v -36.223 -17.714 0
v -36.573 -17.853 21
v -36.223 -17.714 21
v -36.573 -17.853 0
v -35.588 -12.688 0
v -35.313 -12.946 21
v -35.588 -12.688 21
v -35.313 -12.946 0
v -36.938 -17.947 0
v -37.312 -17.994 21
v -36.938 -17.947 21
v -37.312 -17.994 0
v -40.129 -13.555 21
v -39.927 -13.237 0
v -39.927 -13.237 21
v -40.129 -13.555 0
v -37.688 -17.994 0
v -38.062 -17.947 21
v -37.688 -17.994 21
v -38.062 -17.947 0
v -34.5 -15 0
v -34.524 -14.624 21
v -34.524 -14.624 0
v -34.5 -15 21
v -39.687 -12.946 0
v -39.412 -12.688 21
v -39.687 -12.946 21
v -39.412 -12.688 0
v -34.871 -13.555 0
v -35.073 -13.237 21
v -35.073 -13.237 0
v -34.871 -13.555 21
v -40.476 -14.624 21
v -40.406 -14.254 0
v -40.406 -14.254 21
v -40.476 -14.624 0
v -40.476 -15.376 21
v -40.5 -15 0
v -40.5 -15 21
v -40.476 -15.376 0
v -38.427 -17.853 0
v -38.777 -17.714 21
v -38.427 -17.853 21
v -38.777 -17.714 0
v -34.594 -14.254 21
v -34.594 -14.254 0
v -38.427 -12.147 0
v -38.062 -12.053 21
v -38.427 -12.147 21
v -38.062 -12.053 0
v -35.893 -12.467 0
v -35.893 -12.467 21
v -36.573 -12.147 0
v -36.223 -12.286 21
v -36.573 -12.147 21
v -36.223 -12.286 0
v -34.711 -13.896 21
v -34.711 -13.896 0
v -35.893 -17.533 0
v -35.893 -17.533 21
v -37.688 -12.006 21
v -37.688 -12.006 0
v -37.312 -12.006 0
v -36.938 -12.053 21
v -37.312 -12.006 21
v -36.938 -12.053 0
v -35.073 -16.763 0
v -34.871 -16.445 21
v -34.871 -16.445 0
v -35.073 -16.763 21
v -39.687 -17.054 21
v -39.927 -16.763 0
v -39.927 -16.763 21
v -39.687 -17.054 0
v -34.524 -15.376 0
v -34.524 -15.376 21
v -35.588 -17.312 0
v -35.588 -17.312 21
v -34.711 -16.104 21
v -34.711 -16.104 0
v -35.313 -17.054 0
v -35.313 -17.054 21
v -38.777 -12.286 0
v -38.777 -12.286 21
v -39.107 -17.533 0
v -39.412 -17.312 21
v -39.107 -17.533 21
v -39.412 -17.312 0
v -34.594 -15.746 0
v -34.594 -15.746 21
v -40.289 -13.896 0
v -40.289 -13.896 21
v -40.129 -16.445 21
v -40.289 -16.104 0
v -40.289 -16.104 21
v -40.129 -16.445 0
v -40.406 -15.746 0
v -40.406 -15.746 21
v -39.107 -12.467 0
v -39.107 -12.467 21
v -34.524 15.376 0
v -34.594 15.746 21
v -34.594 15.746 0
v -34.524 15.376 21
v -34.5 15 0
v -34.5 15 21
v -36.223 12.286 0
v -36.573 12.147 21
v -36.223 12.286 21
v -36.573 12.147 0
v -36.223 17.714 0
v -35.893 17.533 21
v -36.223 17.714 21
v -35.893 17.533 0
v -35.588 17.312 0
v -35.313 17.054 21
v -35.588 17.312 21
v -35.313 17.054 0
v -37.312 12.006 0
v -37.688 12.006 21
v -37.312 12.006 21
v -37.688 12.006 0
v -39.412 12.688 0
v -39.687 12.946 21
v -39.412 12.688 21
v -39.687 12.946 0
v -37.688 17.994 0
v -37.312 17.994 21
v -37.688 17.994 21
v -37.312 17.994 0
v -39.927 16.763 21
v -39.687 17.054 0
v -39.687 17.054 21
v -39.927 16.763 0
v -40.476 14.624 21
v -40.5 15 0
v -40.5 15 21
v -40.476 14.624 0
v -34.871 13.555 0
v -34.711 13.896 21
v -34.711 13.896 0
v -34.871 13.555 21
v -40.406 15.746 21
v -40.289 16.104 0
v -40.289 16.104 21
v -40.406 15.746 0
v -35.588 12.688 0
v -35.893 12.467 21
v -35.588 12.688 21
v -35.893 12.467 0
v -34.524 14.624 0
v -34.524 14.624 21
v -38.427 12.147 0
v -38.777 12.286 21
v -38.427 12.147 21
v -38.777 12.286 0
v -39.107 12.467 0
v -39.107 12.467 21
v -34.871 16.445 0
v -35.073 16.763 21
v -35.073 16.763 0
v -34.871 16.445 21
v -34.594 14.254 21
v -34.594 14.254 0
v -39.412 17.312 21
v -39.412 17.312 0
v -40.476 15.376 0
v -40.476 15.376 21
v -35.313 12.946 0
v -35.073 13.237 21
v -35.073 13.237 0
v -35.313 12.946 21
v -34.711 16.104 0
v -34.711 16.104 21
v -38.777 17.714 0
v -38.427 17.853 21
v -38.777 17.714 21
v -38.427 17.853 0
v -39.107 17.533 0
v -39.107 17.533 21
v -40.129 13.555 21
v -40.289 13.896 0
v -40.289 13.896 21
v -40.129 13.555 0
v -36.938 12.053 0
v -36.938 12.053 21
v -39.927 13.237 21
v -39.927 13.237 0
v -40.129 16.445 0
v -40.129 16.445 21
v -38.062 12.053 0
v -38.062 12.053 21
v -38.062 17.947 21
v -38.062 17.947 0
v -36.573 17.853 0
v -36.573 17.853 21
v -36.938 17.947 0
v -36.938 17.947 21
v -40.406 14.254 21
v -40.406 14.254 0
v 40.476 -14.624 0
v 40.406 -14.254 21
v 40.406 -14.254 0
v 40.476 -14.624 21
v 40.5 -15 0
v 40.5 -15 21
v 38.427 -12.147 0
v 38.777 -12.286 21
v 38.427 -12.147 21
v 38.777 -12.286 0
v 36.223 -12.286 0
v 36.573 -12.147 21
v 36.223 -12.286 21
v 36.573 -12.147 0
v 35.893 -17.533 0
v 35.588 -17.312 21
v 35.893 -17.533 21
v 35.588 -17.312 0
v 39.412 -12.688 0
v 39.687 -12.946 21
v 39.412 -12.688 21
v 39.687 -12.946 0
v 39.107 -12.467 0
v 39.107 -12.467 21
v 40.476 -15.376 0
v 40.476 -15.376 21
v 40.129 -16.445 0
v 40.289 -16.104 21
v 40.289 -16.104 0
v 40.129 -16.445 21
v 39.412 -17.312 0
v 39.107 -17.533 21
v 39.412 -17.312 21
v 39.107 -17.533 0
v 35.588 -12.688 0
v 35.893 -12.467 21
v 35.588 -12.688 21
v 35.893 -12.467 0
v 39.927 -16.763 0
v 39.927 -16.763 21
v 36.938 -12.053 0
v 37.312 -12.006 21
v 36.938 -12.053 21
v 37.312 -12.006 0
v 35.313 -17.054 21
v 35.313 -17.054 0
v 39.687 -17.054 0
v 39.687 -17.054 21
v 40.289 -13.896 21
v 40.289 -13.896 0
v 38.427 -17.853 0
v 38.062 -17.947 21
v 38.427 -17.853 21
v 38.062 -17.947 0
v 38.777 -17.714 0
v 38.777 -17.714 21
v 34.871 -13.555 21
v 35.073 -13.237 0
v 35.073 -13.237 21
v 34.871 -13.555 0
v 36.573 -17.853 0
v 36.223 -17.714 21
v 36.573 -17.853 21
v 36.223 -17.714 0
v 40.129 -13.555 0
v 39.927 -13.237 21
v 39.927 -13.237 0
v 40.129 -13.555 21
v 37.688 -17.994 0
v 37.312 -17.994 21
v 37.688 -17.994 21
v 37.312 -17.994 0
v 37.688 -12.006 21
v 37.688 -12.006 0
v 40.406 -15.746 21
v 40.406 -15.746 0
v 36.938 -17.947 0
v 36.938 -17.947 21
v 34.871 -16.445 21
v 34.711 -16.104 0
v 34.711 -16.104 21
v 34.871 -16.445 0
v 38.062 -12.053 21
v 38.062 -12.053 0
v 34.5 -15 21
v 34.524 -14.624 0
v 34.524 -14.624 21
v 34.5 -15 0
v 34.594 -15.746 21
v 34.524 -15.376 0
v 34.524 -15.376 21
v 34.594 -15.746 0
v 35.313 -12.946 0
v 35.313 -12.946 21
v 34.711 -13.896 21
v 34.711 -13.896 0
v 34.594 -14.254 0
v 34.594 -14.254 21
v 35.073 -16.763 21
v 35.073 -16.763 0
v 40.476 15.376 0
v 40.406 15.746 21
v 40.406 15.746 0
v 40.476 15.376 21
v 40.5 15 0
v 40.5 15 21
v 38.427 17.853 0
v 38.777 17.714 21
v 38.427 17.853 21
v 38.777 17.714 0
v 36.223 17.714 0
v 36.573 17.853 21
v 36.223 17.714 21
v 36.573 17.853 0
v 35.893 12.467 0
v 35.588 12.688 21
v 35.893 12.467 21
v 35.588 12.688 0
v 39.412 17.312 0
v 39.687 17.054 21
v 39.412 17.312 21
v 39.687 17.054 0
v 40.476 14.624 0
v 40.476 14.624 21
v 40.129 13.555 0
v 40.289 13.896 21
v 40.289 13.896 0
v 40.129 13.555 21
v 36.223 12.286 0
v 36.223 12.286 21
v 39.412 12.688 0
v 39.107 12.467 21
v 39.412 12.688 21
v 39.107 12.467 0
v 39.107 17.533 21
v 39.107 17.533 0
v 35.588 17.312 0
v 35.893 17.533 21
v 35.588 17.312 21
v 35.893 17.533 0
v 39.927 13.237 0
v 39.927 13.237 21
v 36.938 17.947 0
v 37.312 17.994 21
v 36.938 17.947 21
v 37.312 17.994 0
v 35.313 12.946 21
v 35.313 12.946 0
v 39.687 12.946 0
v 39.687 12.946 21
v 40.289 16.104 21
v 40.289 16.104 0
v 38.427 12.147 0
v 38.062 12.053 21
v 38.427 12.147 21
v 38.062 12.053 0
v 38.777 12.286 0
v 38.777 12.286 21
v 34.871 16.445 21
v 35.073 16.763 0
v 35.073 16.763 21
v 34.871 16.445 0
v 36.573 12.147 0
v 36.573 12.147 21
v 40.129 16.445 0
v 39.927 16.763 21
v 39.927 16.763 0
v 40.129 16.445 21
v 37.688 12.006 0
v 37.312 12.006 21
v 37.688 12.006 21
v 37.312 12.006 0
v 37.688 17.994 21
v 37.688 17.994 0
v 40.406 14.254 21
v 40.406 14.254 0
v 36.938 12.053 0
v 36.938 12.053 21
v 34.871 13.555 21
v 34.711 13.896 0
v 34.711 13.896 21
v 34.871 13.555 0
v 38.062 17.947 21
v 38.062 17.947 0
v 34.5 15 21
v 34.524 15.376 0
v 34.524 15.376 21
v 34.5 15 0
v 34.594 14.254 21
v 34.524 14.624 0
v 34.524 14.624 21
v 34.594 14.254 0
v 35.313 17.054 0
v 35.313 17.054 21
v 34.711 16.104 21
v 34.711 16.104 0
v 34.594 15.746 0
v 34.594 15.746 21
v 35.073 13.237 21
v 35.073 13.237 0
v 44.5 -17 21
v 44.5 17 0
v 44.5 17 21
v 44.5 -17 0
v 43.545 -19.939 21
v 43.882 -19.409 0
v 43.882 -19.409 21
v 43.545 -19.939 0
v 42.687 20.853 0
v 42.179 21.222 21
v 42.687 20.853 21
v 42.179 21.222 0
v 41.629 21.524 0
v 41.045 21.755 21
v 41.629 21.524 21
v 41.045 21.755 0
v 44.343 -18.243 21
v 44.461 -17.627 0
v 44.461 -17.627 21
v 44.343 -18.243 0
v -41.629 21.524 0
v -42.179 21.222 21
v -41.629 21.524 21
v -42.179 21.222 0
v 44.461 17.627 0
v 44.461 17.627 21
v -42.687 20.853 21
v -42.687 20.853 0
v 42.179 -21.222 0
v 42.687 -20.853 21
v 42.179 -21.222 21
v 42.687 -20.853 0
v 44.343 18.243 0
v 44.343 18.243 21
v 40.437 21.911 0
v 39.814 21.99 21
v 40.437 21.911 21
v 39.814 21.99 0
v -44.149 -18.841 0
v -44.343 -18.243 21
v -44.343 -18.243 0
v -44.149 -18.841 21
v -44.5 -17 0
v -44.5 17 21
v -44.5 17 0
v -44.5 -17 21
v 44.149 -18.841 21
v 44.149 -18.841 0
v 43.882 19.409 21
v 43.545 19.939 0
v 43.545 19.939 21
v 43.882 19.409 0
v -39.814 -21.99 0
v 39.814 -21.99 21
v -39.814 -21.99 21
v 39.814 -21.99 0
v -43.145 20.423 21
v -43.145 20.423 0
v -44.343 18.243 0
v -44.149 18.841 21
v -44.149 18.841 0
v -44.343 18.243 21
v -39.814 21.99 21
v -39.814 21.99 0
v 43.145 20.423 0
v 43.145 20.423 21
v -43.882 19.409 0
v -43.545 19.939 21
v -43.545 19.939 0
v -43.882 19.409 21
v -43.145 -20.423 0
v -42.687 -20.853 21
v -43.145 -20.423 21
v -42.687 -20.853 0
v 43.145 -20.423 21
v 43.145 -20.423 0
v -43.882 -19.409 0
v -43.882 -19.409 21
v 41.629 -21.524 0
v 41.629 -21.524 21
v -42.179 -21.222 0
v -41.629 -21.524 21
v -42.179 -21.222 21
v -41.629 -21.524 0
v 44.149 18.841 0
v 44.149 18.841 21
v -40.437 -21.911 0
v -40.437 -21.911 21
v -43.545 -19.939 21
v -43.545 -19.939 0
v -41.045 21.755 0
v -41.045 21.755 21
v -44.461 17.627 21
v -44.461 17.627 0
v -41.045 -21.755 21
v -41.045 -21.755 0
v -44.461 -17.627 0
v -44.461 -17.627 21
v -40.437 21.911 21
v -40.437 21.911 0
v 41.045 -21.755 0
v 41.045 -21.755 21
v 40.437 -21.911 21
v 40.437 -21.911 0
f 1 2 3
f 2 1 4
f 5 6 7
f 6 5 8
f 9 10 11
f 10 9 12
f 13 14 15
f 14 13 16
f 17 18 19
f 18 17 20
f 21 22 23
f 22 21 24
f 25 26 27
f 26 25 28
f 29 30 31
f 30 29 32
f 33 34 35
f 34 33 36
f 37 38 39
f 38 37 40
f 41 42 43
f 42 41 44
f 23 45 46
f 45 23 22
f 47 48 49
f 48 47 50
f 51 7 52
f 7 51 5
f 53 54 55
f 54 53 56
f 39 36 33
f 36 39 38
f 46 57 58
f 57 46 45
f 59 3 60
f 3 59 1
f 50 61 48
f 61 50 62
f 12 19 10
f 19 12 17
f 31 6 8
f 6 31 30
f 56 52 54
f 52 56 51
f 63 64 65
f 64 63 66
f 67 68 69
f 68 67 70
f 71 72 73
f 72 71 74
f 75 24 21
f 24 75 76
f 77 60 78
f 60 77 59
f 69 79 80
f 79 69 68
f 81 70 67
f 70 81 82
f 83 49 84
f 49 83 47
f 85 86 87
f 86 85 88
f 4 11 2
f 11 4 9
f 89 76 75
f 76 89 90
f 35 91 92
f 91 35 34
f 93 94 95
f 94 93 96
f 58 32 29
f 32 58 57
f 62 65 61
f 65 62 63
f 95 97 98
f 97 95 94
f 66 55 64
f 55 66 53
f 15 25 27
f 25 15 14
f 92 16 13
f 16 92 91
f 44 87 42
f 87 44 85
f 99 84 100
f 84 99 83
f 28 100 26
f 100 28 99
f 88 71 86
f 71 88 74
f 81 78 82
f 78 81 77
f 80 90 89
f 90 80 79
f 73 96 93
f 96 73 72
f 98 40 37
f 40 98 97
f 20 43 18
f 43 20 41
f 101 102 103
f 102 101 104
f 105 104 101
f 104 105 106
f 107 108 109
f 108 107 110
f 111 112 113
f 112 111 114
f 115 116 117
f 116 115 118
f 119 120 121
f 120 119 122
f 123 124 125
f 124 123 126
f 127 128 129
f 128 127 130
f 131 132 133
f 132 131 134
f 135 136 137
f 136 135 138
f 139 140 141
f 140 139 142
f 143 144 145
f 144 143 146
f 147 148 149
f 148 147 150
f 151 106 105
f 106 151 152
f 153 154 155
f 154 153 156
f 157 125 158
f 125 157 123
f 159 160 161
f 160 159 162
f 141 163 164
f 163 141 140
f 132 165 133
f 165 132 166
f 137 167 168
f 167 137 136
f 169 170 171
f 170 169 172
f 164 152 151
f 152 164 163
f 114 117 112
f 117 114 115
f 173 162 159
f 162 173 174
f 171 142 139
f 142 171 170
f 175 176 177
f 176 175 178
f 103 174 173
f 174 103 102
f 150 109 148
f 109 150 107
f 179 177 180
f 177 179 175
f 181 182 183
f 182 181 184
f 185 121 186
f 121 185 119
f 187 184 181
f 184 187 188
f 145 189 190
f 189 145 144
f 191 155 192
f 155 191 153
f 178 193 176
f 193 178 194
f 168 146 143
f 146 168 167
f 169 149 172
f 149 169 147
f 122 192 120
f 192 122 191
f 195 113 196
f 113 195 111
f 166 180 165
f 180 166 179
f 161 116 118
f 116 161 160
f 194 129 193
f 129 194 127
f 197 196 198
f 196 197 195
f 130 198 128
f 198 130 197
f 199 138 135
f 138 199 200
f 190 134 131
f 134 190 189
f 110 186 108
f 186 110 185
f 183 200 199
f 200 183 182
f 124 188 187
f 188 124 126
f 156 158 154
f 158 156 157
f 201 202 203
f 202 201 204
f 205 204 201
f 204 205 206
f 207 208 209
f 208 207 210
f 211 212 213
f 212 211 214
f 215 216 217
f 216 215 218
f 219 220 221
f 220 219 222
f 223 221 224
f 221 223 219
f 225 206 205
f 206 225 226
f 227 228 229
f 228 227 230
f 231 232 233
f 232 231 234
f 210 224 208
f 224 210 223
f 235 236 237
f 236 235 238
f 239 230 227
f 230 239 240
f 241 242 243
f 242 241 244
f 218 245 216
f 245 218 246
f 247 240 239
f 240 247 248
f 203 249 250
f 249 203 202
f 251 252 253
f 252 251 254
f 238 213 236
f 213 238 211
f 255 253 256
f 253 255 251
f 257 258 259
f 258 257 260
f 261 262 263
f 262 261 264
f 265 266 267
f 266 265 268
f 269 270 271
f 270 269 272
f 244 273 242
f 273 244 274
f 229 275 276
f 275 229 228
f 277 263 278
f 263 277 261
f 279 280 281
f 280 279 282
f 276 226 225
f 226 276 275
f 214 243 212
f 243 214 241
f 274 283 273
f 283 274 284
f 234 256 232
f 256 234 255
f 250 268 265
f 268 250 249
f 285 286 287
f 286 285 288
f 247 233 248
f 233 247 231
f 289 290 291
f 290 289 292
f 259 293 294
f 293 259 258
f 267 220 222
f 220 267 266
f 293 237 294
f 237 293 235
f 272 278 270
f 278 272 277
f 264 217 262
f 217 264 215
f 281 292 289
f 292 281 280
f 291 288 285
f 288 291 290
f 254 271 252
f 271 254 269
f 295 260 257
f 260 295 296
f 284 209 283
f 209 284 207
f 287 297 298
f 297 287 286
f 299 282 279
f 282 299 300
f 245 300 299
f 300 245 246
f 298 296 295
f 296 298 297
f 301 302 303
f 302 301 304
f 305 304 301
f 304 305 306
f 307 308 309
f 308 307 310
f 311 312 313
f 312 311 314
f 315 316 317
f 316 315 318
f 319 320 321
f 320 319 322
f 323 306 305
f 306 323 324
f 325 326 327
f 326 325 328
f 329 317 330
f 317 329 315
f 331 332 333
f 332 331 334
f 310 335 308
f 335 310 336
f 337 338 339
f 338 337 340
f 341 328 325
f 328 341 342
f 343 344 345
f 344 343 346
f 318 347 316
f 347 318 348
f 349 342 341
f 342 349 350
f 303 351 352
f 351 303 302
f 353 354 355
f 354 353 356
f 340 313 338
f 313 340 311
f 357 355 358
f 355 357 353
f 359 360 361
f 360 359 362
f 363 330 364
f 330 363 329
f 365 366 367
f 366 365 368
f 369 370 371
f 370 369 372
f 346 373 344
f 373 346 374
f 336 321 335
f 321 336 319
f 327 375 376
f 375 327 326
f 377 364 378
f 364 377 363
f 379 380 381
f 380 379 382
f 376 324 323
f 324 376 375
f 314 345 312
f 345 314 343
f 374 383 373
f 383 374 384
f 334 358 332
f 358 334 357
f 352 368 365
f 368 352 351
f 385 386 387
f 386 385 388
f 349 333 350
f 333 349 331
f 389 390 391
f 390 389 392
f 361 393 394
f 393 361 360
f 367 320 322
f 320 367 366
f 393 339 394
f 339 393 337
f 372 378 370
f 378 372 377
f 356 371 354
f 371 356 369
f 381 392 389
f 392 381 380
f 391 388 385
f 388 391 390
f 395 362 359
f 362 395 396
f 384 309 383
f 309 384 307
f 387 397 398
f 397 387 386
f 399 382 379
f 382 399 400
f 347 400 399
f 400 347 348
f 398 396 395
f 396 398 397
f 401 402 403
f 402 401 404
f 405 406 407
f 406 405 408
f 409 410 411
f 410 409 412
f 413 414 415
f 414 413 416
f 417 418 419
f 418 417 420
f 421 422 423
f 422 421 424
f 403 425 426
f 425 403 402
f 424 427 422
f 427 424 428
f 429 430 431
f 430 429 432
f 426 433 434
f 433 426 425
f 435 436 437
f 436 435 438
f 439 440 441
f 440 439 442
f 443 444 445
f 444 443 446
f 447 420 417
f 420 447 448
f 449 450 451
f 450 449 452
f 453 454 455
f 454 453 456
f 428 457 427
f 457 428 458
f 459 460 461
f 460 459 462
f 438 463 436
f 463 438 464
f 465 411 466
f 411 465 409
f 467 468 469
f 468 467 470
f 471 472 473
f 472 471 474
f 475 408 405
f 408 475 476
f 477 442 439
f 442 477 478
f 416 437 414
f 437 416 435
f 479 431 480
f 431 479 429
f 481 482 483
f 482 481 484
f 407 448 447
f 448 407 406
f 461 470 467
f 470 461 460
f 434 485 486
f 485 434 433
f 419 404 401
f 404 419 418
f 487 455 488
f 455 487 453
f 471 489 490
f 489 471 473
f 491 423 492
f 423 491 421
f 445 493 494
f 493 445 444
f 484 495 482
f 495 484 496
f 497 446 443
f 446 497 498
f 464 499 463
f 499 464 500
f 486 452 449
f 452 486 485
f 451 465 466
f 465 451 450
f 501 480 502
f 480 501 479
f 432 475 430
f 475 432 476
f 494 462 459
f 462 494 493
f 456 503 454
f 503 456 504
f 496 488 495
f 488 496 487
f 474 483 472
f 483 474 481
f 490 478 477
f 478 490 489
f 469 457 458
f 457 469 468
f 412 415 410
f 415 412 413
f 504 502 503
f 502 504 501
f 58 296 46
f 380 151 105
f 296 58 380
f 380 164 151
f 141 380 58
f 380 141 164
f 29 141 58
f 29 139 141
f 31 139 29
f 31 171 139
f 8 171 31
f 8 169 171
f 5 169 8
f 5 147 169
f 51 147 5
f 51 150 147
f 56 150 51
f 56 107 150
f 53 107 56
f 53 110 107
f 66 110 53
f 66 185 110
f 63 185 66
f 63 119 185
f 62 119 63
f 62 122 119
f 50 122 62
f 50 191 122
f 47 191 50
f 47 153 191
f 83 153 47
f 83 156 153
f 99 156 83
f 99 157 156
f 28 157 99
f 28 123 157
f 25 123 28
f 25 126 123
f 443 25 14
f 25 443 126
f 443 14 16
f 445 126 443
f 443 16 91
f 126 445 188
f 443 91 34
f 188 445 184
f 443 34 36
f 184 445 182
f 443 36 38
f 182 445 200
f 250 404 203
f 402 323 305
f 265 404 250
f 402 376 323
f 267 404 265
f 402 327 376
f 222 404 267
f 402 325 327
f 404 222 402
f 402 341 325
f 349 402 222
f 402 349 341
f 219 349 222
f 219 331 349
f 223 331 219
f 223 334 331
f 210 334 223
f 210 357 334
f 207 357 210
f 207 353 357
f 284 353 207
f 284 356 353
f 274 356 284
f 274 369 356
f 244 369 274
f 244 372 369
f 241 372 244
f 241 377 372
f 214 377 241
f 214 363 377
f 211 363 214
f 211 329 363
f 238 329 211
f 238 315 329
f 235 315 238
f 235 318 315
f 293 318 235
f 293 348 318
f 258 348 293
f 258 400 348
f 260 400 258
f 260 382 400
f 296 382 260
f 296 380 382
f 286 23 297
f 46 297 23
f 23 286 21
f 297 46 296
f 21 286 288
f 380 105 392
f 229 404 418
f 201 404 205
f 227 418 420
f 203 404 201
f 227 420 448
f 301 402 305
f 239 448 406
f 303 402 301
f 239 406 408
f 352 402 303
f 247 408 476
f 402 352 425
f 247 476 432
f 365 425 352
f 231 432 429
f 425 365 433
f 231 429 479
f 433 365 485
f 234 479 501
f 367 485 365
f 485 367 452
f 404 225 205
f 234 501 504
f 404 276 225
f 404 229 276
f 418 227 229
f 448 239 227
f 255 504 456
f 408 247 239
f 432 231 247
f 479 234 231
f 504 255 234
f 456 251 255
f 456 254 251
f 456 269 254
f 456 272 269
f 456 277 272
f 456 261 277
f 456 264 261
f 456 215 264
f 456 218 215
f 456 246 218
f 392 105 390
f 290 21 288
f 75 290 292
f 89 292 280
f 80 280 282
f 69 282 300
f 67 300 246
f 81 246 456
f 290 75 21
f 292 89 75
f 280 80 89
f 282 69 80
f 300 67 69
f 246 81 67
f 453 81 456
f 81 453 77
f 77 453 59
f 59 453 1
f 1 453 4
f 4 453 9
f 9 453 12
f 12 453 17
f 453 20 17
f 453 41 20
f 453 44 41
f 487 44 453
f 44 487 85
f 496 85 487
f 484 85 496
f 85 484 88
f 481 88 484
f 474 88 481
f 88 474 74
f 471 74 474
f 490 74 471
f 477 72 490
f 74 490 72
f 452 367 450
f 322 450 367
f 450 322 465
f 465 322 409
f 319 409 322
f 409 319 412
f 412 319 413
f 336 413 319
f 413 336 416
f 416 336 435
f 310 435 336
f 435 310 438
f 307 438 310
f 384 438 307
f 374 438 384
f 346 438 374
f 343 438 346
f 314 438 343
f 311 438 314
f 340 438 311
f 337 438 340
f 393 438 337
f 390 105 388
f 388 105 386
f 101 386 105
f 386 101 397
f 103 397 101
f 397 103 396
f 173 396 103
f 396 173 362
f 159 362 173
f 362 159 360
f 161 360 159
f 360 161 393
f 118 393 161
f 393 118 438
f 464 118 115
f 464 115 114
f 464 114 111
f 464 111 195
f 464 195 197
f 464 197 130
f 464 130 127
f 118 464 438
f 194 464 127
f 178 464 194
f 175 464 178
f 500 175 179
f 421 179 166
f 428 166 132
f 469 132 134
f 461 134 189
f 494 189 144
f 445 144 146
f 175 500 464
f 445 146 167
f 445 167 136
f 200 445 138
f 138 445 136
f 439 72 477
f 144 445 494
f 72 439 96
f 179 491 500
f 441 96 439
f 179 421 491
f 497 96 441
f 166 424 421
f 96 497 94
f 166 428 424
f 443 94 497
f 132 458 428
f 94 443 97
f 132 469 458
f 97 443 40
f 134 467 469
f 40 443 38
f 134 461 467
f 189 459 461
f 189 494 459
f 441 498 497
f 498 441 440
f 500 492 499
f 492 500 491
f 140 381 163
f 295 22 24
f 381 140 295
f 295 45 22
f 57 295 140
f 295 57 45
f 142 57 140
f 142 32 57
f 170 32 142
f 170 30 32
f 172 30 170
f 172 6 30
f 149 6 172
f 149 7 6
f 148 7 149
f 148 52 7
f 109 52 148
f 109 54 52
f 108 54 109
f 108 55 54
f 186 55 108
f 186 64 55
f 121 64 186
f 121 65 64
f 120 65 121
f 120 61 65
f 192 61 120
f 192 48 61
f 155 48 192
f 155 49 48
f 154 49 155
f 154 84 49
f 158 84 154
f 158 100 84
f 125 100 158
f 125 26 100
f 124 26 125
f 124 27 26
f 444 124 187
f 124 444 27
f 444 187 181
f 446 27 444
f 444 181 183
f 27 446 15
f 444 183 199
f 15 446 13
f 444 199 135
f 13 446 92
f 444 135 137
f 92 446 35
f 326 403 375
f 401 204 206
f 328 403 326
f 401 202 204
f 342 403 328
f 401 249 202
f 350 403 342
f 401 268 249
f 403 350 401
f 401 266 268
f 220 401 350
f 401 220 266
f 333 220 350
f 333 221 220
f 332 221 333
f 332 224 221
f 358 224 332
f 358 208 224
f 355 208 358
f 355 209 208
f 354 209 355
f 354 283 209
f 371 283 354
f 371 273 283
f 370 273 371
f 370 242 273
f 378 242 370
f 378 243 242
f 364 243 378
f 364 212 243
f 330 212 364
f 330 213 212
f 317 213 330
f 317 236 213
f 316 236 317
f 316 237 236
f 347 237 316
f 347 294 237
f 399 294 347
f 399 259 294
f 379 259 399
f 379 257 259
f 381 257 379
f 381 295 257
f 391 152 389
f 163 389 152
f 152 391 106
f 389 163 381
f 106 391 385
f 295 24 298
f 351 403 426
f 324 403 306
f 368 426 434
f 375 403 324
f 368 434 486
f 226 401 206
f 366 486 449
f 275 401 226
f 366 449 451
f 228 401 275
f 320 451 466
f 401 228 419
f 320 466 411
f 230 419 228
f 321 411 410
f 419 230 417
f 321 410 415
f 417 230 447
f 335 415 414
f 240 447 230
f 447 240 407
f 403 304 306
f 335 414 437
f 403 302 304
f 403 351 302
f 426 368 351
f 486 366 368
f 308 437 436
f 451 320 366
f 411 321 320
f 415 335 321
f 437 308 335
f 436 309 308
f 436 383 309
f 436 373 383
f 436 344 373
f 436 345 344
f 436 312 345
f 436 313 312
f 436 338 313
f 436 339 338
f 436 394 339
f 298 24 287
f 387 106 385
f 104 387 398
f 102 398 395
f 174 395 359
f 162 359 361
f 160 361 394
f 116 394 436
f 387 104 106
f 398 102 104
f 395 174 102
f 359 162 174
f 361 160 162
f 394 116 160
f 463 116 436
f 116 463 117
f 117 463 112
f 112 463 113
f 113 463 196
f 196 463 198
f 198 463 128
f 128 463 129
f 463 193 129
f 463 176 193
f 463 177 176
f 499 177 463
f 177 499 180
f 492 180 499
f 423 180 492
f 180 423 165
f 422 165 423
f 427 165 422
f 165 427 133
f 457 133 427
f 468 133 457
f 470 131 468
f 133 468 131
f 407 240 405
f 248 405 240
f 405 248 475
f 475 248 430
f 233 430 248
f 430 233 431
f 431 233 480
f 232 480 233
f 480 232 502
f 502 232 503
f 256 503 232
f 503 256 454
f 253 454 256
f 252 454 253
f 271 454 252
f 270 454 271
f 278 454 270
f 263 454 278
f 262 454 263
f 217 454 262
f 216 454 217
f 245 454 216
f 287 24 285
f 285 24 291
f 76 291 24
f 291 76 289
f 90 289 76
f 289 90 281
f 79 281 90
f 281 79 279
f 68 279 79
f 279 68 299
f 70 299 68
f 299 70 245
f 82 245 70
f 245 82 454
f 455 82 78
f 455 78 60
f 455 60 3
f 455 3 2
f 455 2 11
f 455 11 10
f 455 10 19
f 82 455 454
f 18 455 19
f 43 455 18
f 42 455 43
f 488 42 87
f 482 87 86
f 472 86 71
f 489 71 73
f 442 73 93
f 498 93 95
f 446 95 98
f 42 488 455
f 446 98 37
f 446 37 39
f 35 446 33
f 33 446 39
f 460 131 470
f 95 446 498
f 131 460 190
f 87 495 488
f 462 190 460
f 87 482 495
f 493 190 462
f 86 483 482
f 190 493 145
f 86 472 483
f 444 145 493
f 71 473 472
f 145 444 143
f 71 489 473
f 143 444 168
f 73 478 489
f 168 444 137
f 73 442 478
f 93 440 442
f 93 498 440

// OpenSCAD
$fn = 50;


difference() {
	union() {
		hull() {
			translate(v = [-39.5000000000, 17.0000000000, 0]) {
				cylinder(h = 21, r = 5);
			}
			translate(v = [39.5000000000, 17.0000000000, 0]) {
				cylinder(h = 21, r = 5);
			}
			translate(v = [-39.5000000000, -17.0000000000, 0]) {
				cylinder(h = 21, r = 5);
			}
			translate(v = [39.5000000000, -17.0000000000, 0]) {
				cylinder(h = 21, r = 5);
			}
		}
	}
	union() {
		translate(v = [-37.5000000000, -15.0000000000, -100.0000000000]) {
			cylinder(h = 200, r = 3.0000000000);
		}
		translate(v = [-37.5000000000, 15.0000000000, -100.0000000000]) {
			cylinder(h = 200, r = 3.0000000000);
		}
		translate(v = [37.5000000000, -15.0000000000, -100.0000000000]) {
			cylinder(h = 200, r = 3.0000000000);
		}
		translate(v = [37.5000000000, 15.0000000000, -100.0000000000]) {
			cylinder(h = 200, r = 3.0000000000);
		}
	}
}
